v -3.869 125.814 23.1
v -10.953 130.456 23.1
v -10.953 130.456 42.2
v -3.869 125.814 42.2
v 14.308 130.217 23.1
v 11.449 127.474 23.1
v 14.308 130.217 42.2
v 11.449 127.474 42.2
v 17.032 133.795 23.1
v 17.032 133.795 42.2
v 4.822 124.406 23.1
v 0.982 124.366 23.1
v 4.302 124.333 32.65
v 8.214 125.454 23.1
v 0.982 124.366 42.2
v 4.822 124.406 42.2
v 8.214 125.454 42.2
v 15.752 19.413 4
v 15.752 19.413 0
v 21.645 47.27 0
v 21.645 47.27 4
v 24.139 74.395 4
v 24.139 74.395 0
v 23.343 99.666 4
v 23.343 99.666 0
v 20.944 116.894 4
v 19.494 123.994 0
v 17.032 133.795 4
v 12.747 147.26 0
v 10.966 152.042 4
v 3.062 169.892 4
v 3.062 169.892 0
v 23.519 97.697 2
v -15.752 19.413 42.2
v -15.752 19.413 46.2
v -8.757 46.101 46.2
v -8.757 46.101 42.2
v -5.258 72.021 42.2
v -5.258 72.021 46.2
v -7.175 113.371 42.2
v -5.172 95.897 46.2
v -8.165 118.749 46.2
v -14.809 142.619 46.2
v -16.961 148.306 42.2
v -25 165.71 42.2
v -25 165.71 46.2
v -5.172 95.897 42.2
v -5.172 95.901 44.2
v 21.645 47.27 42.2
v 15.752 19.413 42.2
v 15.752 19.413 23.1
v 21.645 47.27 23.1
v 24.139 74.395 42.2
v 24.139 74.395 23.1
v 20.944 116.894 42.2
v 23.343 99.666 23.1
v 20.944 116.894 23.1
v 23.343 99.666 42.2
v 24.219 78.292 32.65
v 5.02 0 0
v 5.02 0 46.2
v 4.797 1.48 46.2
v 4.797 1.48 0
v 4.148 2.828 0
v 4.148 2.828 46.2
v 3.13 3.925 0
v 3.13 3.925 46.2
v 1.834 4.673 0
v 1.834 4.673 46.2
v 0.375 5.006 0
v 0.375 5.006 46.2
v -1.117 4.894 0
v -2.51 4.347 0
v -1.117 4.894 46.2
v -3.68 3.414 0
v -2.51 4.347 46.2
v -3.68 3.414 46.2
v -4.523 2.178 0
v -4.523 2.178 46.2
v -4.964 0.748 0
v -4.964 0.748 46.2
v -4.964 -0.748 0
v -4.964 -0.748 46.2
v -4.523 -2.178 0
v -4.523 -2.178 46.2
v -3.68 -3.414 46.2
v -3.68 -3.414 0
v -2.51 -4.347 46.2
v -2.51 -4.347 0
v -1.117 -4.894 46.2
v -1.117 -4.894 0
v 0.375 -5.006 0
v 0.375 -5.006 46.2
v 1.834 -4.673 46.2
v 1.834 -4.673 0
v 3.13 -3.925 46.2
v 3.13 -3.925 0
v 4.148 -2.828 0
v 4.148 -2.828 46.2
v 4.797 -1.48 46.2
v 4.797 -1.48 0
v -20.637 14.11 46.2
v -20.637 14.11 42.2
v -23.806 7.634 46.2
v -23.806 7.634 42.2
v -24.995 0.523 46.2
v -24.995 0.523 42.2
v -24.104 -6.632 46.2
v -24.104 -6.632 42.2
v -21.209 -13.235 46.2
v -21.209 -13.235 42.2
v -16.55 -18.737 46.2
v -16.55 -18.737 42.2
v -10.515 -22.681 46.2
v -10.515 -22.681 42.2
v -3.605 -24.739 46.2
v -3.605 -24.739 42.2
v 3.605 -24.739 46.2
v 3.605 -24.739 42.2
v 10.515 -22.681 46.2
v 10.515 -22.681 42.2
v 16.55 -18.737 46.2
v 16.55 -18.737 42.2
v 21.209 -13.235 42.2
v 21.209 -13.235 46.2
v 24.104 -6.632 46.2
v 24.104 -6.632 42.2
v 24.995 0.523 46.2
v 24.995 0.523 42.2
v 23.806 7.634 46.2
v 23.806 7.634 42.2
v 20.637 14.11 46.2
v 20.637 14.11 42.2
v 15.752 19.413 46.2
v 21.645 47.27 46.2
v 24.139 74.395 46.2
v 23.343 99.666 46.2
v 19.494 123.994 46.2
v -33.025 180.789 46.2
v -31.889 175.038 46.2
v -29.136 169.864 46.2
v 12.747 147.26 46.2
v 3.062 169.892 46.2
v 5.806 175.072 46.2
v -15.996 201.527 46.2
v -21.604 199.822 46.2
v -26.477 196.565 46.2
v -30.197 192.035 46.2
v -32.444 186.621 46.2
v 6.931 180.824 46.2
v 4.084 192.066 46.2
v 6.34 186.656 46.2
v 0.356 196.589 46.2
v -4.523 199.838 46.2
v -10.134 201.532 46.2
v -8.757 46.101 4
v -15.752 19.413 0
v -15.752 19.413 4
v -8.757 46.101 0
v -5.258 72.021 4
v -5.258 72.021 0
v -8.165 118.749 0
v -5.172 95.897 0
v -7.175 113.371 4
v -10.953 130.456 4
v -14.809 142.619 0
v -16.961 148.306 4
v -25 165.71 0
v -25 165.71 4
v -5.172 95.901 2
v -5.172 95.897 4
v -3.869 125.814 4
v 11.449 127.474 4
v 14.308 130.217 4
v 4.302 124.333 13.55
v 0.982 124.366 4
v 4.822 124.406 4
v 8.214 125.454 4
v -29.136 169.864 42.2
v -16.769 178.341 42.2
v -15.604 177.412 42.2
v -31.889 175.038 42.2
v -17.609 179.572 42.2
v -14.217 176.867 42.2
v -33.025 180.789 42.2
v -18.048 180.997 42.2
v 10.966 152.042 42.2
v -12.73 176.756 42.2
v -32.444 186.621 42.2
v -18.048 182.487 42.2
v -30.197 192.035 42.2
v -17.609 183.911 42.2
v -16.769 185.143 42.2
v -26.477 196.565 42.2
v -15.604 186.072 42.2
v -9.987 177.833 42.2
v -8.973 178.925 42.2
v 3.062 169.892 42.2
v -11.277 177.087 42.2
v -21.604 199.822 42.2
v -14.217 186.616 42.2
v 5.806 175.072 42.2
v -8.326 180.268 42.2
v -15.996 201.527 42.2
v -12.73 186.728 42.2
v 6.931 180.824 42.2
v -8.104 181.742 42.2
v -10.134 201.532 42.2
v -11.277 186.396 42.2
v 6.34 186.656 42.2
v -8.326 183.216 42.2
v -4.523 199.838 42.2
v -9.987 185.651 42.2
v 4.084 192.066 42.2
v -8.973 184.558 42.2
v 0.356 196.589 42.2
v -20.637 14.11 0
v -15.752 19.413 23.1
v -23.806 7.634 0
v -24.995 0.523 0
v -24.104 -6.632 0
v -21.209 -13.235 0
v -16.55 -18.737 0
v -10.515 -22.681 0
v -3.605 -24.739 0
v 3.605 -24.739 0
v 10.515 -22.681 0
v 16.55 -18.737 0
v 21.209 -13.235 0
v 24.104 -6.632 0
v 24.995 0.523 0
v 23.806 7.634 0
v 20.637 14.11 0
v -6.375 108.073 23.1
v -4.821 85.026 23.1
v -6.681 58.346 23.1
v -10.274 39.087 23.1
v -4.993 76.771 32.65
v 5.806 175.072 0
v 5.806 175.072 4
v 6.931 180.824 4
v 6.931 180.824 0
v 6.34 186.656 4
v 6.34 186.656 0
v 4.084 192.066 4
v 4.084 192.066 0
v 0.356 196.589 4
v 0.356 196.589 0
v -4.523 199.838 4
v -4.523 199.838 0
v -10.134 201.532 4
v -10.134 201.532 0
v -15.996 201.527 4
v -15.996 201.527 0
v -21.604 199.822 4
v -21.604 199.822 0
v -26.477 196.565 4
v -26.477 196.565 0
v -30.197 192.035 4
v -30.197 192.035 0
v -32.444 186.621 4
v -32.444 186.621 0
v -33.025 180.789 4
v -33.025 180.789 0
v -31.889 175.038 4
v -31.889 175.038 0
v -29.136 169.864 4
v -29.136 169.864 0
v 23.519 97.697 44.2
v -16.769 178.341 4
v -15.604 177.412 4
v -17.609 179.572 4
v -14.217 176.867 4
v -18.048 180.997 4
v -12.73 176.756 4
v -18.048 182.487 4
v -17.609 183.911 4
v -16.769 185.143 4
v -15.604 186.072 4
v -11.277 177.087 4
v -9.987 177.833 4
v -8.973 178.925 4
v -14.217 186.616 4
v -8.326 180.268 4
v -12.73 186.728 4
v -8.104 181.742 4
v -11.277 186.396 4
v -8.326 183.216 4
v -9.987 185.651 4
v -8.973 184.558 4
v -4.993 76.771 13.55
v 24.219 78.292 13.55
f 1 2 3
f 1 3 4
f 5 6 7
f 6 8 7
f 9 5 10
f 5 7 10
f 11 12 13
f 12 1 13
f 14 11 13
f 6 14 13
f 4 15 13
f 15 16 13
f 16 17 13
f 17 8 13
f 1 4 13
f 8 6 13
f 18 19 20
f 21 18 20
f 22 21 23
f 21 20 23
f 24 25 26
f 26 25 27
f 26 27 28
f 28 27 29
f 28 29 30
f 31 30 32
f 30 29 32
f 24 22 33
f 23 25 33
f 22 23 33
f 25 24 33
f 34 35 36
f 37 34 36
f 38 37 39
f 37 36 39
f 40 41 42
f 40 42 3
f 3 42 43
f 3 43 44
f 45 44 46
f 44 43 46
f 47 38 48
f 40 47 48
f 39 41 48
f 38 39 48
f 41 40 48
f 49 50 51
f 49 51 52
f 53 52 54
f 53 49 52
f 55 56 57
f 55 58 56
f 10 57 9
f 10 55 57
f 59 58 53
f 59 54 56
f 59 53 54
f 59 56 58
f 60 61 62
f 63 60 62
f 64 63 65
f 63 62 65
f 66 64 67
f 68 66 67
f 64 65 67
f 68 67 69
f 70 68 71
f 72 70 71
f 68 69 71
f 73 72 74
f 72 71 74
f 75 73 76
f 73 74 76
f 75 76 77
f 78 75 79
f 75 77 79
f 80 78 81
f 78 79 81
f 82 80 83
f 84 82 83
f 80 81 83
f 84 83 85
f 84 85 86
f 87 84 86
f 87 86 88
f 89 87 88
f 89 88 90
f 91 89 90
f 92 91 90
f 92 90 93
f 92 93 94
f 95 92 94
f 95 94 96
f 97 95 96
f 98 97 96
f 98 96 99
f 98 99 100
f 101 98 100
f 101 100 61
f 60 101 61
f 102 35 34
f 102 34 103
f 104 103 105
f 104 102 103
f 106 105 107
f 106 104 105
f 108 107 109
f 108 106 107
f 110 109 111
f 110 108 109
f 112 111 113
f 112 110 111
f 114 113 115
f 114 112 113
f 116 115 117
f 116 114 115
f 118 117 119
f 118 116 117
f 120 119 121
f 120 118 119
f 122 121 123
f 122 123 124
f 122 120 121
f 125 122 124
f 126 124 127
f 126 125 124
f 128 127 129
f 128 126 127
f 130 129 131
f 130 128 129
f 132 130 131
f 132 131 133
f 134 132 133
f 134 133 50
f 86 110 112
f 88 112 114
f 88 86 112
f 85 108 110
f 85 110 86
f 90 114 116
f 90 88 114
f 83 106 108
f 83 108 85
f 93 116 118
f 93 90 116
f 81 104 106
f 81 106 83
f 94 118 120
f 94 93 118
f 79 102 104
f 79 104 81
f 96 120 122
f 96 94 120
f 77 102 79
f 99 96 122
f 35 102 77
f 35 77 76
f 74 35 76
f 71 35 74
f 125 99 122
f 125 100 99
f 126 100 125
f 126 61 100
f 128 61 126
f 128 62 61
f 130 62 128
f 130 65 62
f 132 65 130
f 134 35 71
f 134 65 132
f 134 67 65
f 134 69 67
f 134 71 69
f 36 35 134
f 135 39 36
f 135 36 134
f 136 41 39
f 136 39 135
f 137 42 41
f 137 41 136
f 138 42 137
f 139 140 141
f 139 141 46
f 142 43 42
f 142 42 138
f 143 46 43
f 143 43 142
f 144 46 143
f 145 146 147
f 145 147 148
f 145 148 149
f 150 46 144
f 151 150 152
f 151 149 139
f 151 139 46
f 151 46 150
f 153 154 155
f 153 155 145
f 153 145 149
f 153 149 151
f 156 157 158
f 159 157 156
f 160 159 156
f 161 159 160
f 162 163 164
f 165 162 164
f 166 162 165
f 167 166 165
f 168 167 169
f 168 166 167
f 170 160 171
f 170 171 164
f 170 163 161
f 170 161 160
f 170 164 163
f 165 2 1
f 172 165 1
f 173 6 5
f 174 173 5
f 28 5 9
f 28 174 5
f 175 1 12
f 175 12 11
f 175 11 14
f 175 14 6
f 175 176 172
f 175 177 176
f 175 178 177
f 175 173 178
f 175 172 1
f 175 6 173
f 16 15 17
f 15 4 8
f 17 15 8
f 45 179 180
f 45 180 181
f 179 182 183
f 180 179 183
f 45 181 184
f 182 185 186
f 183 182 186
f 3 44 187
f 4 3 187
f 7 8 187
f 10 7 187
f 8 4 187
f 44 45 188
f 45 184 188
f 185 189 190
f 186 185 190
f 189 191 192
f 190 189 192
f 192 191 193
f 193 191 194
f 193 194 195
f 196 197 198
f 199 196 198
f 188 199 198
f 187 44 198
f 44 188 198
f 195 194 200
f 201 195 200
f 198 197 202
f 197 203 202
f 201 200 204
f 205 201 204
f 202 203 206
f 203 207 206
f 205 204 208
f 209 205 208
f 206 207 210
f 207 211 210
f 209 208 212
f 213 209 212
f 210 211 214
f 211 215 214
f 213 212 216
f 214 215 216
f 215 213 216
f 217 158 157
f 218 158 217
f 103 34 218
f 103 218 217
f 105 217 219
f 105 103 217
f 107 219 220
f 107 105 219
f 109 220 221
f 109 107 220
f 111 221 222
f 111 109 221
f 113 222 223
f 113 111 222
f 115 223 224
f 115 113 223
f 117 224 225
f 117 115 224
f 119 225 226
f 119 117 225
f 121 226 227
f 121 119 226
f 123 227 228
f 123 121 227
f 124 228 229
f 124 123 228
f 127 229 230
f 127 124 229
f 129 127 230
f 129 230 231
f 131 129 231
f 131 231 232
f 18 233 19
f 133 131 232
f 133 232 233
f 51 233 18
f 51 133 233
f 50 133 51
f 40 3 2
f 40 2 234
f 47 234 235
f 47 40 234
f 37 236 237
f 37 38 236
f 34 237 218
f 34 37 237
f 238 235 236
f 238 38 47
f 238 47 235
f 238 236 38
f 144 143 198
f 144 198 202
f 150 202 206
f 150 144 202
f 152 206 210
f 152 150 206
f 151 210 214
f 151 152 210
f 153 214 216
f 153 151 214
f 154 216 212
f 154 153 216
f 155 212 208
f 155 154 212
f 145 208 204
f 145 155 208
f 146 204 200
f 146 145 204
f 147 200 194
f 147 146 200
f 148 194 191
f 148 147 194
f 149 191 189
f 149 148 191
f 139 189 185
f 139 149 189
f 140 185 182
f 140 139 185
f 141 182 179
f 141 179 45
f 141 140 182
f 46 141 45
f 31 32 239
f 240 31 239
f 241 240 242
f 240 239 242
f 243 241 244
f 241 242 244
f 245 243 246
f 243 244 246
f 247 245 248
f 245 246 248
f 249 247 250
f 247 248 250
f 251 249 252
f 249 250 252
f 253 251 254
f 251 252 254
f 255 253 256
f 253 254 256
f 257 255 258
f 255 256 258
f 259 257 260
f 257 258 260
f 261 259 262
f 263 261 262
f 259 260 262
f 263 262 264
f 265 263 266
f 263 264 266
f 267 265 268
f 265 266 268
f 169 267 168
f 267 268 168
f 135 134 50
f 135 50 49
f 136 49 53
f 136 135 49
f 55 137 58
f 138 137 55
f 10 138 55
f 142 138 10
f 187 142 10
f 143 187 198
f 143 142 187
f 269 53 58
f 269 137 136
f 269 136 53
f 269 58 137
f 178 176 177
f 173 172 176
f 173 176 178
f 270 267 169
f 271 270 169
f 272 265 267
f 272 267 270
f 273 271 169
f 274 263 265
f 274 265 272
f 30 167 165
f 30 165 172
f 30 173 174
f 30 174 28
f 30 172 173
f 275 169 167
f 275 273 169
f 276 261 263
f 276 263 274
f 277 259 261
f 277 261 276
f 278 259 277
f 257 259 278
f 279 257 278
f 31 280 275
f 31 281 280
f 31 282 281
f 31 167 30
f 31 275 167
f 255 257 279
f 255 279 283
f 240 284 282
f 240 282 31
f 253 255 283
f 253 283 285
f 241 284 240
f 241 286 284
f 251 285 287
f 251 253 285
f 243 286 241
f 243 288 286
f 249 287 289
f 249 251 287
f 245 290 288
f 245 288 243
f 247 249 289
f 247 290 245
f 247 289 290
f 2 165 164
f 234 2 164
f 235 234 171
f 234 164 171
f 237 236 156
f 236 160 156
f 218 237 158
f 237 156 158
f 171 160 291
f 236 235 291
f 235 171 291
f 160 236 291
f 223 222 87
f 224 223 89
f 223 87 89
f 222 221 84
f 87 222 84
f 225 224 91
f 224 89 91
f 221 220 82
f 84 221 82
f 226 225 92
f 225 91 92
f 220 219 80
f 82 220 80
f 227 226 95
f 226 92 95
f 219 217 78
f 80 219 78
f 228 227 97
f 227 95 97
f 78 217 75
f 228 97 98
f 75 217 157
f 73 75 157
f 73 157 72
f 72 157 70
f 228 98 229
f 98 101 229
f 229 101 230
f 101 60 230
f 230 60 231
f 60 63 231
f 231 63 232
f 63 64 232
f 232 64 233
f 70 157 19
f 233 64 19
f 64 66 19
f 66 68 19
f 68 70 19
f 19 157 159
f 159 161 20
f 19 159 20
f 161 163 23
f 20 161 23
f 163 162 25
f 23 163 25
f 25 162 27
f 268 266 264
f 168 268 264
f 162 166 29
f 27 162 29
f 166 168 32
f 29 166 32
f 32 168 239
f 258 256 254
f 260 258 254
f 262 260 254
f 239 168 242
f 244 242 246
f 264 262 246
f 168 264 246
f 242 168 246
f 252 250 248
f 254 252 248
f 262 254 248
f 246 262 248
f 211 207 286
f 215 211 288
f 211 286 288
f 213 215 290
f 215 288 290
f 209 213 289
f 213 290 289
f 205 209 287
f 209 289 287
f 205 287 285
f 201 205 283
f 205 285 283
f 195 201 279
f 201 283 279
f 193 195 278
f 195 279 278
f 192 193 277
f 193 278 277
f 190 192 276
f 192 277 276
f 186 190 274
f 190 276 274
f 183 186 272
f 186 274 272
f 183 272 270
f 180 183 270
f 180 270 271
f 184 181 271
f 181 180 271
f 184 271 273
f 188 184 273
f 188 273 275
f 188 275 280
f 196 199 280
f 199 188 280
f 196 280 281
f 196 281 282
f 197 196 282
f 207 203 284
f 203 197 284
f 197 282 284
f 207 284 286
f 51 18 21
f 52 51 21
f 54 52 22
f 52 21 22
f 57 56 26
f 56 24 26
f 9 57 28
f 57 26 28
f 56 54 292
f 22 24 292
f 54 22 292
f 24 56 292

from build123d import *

# Parameters (mm, degrees)
SKETCH1_R                = 20
SKETCH1_R_2              = 25
BOSS_EXTRUDE1_DEPTH      = 4
BOSS_EXTRUDE2_DEPTH      = 19.1
SKETCH5_R                = 5.02
CUT_EXTRUDE1_DEPTH       = 49.2
SKETCH7_R                = 5
BOSS_EXTRUDE4_DEPTH      = 40.2
BOSS_EXTRUDE4_DEPTH_BACK = 2.2


with BuildPart() as part:
    # Sketch1 → Boss-Extrude1 (new body)
    with BuildSketch(Plane.XY):
        with Locations((-13.047428352, 181.745231989)):
            Circle(SKETCH1_R)
        with BuildLine():
            ThreePointArc((-15.752419285, 19.412915461), (0, 25), (15.752419285, 19.412915461))
            add(Edge.make_bspline(
                [(15.752419285, 19.412915461), (37.630116676, 100.741066361), (3.061753137, 169.892204032)],
                knots=[0, 0, 0, 1, 1, 1], degree=2))
            ThreePointArc((3.061753137, 169.892204032), (-10.099117092, 161.963739105), (-25, 165.709770319))
            add(Edge.make_bspline(
                [(-15.752419285, 19.412915461), (10.03237034, 99.240514814), (-25, 165.709770319)],
                knots=[0, 0, 0, 1, 1, 1], degree=2))
        make_face()
        Circle(SKETCH1_R_2)
    extrude(amount=BOSS_EXTRUDE1_DEPTH)

    # Sketch4 → Boss-Extrude2 (add)
    with BuildSketch(Plane.XY.offset(4)):
        with BuildLine():
            ThreePointArc((-15.752419292, 19.412915437), (1e-08, -24.999999987), (15.752419285, 19.412915461))
            add(Edge.make_bspline(
                [(15.752419285, 19.412915461), (32.045521078, 79.98089104), (17.031874688, 133.795114798)],
                knots=[0, 0, 0, 1, 1, 1], degree=2))
            add(Edge.make_bspline(
                [(-10.953146695, 130.455943826), (5.564580589, 116.540527234), (17.031874688, 133.795114798)],
                knots=[0, 0, 0, 1, 1, 1], degree=2))
            add(Edge.make_bspline(
                [(-10.953146695, 130.455943826), (3.367631556, 78.60702873), (-15.752419292, 19.412915437)],
                knots=[0, 0, 0, 1, 1, 1], degree=2))
        make_face()
    extrude(amount=BOSS_EXTRUDE2_DEPTH)

    # Mirror18: part across plane


with BuildPart() as part_1:
    add(part.part)
    add(part.part.mirror(Plane(origin=(4.301972293, 124.333028273, 23.1), x_dir=(1, 0, 0), z_dir=(0, 0, -1))))

    # Sketch5 → Cut-Extrude1 (cut)
    with BuildSketch(Plane.XY.offset(46.2)):
        Circle(SKETCH5_R)
    extrude(amount=-CUT_EXTRUDE1_DEPTH, mode=Mode.SUBTRACT)

    # Sketch7 → Boss-Extrude4 (add, two sides)
    with BuildSketch(Plane.XY.offset(4)) as boss_extrude4_sk:
        with Locations((-13.104058639, 181.741755044)):
            Circle(SKETCH7_R)
    extrude(amount=BOSS_EXTRUDE4_DEPTH)
    extrude(boss_extrude4_sk.sketch, amount=-BOSS_EXTRUDE4_DEPTH_BACK)


solid = part_1.part
